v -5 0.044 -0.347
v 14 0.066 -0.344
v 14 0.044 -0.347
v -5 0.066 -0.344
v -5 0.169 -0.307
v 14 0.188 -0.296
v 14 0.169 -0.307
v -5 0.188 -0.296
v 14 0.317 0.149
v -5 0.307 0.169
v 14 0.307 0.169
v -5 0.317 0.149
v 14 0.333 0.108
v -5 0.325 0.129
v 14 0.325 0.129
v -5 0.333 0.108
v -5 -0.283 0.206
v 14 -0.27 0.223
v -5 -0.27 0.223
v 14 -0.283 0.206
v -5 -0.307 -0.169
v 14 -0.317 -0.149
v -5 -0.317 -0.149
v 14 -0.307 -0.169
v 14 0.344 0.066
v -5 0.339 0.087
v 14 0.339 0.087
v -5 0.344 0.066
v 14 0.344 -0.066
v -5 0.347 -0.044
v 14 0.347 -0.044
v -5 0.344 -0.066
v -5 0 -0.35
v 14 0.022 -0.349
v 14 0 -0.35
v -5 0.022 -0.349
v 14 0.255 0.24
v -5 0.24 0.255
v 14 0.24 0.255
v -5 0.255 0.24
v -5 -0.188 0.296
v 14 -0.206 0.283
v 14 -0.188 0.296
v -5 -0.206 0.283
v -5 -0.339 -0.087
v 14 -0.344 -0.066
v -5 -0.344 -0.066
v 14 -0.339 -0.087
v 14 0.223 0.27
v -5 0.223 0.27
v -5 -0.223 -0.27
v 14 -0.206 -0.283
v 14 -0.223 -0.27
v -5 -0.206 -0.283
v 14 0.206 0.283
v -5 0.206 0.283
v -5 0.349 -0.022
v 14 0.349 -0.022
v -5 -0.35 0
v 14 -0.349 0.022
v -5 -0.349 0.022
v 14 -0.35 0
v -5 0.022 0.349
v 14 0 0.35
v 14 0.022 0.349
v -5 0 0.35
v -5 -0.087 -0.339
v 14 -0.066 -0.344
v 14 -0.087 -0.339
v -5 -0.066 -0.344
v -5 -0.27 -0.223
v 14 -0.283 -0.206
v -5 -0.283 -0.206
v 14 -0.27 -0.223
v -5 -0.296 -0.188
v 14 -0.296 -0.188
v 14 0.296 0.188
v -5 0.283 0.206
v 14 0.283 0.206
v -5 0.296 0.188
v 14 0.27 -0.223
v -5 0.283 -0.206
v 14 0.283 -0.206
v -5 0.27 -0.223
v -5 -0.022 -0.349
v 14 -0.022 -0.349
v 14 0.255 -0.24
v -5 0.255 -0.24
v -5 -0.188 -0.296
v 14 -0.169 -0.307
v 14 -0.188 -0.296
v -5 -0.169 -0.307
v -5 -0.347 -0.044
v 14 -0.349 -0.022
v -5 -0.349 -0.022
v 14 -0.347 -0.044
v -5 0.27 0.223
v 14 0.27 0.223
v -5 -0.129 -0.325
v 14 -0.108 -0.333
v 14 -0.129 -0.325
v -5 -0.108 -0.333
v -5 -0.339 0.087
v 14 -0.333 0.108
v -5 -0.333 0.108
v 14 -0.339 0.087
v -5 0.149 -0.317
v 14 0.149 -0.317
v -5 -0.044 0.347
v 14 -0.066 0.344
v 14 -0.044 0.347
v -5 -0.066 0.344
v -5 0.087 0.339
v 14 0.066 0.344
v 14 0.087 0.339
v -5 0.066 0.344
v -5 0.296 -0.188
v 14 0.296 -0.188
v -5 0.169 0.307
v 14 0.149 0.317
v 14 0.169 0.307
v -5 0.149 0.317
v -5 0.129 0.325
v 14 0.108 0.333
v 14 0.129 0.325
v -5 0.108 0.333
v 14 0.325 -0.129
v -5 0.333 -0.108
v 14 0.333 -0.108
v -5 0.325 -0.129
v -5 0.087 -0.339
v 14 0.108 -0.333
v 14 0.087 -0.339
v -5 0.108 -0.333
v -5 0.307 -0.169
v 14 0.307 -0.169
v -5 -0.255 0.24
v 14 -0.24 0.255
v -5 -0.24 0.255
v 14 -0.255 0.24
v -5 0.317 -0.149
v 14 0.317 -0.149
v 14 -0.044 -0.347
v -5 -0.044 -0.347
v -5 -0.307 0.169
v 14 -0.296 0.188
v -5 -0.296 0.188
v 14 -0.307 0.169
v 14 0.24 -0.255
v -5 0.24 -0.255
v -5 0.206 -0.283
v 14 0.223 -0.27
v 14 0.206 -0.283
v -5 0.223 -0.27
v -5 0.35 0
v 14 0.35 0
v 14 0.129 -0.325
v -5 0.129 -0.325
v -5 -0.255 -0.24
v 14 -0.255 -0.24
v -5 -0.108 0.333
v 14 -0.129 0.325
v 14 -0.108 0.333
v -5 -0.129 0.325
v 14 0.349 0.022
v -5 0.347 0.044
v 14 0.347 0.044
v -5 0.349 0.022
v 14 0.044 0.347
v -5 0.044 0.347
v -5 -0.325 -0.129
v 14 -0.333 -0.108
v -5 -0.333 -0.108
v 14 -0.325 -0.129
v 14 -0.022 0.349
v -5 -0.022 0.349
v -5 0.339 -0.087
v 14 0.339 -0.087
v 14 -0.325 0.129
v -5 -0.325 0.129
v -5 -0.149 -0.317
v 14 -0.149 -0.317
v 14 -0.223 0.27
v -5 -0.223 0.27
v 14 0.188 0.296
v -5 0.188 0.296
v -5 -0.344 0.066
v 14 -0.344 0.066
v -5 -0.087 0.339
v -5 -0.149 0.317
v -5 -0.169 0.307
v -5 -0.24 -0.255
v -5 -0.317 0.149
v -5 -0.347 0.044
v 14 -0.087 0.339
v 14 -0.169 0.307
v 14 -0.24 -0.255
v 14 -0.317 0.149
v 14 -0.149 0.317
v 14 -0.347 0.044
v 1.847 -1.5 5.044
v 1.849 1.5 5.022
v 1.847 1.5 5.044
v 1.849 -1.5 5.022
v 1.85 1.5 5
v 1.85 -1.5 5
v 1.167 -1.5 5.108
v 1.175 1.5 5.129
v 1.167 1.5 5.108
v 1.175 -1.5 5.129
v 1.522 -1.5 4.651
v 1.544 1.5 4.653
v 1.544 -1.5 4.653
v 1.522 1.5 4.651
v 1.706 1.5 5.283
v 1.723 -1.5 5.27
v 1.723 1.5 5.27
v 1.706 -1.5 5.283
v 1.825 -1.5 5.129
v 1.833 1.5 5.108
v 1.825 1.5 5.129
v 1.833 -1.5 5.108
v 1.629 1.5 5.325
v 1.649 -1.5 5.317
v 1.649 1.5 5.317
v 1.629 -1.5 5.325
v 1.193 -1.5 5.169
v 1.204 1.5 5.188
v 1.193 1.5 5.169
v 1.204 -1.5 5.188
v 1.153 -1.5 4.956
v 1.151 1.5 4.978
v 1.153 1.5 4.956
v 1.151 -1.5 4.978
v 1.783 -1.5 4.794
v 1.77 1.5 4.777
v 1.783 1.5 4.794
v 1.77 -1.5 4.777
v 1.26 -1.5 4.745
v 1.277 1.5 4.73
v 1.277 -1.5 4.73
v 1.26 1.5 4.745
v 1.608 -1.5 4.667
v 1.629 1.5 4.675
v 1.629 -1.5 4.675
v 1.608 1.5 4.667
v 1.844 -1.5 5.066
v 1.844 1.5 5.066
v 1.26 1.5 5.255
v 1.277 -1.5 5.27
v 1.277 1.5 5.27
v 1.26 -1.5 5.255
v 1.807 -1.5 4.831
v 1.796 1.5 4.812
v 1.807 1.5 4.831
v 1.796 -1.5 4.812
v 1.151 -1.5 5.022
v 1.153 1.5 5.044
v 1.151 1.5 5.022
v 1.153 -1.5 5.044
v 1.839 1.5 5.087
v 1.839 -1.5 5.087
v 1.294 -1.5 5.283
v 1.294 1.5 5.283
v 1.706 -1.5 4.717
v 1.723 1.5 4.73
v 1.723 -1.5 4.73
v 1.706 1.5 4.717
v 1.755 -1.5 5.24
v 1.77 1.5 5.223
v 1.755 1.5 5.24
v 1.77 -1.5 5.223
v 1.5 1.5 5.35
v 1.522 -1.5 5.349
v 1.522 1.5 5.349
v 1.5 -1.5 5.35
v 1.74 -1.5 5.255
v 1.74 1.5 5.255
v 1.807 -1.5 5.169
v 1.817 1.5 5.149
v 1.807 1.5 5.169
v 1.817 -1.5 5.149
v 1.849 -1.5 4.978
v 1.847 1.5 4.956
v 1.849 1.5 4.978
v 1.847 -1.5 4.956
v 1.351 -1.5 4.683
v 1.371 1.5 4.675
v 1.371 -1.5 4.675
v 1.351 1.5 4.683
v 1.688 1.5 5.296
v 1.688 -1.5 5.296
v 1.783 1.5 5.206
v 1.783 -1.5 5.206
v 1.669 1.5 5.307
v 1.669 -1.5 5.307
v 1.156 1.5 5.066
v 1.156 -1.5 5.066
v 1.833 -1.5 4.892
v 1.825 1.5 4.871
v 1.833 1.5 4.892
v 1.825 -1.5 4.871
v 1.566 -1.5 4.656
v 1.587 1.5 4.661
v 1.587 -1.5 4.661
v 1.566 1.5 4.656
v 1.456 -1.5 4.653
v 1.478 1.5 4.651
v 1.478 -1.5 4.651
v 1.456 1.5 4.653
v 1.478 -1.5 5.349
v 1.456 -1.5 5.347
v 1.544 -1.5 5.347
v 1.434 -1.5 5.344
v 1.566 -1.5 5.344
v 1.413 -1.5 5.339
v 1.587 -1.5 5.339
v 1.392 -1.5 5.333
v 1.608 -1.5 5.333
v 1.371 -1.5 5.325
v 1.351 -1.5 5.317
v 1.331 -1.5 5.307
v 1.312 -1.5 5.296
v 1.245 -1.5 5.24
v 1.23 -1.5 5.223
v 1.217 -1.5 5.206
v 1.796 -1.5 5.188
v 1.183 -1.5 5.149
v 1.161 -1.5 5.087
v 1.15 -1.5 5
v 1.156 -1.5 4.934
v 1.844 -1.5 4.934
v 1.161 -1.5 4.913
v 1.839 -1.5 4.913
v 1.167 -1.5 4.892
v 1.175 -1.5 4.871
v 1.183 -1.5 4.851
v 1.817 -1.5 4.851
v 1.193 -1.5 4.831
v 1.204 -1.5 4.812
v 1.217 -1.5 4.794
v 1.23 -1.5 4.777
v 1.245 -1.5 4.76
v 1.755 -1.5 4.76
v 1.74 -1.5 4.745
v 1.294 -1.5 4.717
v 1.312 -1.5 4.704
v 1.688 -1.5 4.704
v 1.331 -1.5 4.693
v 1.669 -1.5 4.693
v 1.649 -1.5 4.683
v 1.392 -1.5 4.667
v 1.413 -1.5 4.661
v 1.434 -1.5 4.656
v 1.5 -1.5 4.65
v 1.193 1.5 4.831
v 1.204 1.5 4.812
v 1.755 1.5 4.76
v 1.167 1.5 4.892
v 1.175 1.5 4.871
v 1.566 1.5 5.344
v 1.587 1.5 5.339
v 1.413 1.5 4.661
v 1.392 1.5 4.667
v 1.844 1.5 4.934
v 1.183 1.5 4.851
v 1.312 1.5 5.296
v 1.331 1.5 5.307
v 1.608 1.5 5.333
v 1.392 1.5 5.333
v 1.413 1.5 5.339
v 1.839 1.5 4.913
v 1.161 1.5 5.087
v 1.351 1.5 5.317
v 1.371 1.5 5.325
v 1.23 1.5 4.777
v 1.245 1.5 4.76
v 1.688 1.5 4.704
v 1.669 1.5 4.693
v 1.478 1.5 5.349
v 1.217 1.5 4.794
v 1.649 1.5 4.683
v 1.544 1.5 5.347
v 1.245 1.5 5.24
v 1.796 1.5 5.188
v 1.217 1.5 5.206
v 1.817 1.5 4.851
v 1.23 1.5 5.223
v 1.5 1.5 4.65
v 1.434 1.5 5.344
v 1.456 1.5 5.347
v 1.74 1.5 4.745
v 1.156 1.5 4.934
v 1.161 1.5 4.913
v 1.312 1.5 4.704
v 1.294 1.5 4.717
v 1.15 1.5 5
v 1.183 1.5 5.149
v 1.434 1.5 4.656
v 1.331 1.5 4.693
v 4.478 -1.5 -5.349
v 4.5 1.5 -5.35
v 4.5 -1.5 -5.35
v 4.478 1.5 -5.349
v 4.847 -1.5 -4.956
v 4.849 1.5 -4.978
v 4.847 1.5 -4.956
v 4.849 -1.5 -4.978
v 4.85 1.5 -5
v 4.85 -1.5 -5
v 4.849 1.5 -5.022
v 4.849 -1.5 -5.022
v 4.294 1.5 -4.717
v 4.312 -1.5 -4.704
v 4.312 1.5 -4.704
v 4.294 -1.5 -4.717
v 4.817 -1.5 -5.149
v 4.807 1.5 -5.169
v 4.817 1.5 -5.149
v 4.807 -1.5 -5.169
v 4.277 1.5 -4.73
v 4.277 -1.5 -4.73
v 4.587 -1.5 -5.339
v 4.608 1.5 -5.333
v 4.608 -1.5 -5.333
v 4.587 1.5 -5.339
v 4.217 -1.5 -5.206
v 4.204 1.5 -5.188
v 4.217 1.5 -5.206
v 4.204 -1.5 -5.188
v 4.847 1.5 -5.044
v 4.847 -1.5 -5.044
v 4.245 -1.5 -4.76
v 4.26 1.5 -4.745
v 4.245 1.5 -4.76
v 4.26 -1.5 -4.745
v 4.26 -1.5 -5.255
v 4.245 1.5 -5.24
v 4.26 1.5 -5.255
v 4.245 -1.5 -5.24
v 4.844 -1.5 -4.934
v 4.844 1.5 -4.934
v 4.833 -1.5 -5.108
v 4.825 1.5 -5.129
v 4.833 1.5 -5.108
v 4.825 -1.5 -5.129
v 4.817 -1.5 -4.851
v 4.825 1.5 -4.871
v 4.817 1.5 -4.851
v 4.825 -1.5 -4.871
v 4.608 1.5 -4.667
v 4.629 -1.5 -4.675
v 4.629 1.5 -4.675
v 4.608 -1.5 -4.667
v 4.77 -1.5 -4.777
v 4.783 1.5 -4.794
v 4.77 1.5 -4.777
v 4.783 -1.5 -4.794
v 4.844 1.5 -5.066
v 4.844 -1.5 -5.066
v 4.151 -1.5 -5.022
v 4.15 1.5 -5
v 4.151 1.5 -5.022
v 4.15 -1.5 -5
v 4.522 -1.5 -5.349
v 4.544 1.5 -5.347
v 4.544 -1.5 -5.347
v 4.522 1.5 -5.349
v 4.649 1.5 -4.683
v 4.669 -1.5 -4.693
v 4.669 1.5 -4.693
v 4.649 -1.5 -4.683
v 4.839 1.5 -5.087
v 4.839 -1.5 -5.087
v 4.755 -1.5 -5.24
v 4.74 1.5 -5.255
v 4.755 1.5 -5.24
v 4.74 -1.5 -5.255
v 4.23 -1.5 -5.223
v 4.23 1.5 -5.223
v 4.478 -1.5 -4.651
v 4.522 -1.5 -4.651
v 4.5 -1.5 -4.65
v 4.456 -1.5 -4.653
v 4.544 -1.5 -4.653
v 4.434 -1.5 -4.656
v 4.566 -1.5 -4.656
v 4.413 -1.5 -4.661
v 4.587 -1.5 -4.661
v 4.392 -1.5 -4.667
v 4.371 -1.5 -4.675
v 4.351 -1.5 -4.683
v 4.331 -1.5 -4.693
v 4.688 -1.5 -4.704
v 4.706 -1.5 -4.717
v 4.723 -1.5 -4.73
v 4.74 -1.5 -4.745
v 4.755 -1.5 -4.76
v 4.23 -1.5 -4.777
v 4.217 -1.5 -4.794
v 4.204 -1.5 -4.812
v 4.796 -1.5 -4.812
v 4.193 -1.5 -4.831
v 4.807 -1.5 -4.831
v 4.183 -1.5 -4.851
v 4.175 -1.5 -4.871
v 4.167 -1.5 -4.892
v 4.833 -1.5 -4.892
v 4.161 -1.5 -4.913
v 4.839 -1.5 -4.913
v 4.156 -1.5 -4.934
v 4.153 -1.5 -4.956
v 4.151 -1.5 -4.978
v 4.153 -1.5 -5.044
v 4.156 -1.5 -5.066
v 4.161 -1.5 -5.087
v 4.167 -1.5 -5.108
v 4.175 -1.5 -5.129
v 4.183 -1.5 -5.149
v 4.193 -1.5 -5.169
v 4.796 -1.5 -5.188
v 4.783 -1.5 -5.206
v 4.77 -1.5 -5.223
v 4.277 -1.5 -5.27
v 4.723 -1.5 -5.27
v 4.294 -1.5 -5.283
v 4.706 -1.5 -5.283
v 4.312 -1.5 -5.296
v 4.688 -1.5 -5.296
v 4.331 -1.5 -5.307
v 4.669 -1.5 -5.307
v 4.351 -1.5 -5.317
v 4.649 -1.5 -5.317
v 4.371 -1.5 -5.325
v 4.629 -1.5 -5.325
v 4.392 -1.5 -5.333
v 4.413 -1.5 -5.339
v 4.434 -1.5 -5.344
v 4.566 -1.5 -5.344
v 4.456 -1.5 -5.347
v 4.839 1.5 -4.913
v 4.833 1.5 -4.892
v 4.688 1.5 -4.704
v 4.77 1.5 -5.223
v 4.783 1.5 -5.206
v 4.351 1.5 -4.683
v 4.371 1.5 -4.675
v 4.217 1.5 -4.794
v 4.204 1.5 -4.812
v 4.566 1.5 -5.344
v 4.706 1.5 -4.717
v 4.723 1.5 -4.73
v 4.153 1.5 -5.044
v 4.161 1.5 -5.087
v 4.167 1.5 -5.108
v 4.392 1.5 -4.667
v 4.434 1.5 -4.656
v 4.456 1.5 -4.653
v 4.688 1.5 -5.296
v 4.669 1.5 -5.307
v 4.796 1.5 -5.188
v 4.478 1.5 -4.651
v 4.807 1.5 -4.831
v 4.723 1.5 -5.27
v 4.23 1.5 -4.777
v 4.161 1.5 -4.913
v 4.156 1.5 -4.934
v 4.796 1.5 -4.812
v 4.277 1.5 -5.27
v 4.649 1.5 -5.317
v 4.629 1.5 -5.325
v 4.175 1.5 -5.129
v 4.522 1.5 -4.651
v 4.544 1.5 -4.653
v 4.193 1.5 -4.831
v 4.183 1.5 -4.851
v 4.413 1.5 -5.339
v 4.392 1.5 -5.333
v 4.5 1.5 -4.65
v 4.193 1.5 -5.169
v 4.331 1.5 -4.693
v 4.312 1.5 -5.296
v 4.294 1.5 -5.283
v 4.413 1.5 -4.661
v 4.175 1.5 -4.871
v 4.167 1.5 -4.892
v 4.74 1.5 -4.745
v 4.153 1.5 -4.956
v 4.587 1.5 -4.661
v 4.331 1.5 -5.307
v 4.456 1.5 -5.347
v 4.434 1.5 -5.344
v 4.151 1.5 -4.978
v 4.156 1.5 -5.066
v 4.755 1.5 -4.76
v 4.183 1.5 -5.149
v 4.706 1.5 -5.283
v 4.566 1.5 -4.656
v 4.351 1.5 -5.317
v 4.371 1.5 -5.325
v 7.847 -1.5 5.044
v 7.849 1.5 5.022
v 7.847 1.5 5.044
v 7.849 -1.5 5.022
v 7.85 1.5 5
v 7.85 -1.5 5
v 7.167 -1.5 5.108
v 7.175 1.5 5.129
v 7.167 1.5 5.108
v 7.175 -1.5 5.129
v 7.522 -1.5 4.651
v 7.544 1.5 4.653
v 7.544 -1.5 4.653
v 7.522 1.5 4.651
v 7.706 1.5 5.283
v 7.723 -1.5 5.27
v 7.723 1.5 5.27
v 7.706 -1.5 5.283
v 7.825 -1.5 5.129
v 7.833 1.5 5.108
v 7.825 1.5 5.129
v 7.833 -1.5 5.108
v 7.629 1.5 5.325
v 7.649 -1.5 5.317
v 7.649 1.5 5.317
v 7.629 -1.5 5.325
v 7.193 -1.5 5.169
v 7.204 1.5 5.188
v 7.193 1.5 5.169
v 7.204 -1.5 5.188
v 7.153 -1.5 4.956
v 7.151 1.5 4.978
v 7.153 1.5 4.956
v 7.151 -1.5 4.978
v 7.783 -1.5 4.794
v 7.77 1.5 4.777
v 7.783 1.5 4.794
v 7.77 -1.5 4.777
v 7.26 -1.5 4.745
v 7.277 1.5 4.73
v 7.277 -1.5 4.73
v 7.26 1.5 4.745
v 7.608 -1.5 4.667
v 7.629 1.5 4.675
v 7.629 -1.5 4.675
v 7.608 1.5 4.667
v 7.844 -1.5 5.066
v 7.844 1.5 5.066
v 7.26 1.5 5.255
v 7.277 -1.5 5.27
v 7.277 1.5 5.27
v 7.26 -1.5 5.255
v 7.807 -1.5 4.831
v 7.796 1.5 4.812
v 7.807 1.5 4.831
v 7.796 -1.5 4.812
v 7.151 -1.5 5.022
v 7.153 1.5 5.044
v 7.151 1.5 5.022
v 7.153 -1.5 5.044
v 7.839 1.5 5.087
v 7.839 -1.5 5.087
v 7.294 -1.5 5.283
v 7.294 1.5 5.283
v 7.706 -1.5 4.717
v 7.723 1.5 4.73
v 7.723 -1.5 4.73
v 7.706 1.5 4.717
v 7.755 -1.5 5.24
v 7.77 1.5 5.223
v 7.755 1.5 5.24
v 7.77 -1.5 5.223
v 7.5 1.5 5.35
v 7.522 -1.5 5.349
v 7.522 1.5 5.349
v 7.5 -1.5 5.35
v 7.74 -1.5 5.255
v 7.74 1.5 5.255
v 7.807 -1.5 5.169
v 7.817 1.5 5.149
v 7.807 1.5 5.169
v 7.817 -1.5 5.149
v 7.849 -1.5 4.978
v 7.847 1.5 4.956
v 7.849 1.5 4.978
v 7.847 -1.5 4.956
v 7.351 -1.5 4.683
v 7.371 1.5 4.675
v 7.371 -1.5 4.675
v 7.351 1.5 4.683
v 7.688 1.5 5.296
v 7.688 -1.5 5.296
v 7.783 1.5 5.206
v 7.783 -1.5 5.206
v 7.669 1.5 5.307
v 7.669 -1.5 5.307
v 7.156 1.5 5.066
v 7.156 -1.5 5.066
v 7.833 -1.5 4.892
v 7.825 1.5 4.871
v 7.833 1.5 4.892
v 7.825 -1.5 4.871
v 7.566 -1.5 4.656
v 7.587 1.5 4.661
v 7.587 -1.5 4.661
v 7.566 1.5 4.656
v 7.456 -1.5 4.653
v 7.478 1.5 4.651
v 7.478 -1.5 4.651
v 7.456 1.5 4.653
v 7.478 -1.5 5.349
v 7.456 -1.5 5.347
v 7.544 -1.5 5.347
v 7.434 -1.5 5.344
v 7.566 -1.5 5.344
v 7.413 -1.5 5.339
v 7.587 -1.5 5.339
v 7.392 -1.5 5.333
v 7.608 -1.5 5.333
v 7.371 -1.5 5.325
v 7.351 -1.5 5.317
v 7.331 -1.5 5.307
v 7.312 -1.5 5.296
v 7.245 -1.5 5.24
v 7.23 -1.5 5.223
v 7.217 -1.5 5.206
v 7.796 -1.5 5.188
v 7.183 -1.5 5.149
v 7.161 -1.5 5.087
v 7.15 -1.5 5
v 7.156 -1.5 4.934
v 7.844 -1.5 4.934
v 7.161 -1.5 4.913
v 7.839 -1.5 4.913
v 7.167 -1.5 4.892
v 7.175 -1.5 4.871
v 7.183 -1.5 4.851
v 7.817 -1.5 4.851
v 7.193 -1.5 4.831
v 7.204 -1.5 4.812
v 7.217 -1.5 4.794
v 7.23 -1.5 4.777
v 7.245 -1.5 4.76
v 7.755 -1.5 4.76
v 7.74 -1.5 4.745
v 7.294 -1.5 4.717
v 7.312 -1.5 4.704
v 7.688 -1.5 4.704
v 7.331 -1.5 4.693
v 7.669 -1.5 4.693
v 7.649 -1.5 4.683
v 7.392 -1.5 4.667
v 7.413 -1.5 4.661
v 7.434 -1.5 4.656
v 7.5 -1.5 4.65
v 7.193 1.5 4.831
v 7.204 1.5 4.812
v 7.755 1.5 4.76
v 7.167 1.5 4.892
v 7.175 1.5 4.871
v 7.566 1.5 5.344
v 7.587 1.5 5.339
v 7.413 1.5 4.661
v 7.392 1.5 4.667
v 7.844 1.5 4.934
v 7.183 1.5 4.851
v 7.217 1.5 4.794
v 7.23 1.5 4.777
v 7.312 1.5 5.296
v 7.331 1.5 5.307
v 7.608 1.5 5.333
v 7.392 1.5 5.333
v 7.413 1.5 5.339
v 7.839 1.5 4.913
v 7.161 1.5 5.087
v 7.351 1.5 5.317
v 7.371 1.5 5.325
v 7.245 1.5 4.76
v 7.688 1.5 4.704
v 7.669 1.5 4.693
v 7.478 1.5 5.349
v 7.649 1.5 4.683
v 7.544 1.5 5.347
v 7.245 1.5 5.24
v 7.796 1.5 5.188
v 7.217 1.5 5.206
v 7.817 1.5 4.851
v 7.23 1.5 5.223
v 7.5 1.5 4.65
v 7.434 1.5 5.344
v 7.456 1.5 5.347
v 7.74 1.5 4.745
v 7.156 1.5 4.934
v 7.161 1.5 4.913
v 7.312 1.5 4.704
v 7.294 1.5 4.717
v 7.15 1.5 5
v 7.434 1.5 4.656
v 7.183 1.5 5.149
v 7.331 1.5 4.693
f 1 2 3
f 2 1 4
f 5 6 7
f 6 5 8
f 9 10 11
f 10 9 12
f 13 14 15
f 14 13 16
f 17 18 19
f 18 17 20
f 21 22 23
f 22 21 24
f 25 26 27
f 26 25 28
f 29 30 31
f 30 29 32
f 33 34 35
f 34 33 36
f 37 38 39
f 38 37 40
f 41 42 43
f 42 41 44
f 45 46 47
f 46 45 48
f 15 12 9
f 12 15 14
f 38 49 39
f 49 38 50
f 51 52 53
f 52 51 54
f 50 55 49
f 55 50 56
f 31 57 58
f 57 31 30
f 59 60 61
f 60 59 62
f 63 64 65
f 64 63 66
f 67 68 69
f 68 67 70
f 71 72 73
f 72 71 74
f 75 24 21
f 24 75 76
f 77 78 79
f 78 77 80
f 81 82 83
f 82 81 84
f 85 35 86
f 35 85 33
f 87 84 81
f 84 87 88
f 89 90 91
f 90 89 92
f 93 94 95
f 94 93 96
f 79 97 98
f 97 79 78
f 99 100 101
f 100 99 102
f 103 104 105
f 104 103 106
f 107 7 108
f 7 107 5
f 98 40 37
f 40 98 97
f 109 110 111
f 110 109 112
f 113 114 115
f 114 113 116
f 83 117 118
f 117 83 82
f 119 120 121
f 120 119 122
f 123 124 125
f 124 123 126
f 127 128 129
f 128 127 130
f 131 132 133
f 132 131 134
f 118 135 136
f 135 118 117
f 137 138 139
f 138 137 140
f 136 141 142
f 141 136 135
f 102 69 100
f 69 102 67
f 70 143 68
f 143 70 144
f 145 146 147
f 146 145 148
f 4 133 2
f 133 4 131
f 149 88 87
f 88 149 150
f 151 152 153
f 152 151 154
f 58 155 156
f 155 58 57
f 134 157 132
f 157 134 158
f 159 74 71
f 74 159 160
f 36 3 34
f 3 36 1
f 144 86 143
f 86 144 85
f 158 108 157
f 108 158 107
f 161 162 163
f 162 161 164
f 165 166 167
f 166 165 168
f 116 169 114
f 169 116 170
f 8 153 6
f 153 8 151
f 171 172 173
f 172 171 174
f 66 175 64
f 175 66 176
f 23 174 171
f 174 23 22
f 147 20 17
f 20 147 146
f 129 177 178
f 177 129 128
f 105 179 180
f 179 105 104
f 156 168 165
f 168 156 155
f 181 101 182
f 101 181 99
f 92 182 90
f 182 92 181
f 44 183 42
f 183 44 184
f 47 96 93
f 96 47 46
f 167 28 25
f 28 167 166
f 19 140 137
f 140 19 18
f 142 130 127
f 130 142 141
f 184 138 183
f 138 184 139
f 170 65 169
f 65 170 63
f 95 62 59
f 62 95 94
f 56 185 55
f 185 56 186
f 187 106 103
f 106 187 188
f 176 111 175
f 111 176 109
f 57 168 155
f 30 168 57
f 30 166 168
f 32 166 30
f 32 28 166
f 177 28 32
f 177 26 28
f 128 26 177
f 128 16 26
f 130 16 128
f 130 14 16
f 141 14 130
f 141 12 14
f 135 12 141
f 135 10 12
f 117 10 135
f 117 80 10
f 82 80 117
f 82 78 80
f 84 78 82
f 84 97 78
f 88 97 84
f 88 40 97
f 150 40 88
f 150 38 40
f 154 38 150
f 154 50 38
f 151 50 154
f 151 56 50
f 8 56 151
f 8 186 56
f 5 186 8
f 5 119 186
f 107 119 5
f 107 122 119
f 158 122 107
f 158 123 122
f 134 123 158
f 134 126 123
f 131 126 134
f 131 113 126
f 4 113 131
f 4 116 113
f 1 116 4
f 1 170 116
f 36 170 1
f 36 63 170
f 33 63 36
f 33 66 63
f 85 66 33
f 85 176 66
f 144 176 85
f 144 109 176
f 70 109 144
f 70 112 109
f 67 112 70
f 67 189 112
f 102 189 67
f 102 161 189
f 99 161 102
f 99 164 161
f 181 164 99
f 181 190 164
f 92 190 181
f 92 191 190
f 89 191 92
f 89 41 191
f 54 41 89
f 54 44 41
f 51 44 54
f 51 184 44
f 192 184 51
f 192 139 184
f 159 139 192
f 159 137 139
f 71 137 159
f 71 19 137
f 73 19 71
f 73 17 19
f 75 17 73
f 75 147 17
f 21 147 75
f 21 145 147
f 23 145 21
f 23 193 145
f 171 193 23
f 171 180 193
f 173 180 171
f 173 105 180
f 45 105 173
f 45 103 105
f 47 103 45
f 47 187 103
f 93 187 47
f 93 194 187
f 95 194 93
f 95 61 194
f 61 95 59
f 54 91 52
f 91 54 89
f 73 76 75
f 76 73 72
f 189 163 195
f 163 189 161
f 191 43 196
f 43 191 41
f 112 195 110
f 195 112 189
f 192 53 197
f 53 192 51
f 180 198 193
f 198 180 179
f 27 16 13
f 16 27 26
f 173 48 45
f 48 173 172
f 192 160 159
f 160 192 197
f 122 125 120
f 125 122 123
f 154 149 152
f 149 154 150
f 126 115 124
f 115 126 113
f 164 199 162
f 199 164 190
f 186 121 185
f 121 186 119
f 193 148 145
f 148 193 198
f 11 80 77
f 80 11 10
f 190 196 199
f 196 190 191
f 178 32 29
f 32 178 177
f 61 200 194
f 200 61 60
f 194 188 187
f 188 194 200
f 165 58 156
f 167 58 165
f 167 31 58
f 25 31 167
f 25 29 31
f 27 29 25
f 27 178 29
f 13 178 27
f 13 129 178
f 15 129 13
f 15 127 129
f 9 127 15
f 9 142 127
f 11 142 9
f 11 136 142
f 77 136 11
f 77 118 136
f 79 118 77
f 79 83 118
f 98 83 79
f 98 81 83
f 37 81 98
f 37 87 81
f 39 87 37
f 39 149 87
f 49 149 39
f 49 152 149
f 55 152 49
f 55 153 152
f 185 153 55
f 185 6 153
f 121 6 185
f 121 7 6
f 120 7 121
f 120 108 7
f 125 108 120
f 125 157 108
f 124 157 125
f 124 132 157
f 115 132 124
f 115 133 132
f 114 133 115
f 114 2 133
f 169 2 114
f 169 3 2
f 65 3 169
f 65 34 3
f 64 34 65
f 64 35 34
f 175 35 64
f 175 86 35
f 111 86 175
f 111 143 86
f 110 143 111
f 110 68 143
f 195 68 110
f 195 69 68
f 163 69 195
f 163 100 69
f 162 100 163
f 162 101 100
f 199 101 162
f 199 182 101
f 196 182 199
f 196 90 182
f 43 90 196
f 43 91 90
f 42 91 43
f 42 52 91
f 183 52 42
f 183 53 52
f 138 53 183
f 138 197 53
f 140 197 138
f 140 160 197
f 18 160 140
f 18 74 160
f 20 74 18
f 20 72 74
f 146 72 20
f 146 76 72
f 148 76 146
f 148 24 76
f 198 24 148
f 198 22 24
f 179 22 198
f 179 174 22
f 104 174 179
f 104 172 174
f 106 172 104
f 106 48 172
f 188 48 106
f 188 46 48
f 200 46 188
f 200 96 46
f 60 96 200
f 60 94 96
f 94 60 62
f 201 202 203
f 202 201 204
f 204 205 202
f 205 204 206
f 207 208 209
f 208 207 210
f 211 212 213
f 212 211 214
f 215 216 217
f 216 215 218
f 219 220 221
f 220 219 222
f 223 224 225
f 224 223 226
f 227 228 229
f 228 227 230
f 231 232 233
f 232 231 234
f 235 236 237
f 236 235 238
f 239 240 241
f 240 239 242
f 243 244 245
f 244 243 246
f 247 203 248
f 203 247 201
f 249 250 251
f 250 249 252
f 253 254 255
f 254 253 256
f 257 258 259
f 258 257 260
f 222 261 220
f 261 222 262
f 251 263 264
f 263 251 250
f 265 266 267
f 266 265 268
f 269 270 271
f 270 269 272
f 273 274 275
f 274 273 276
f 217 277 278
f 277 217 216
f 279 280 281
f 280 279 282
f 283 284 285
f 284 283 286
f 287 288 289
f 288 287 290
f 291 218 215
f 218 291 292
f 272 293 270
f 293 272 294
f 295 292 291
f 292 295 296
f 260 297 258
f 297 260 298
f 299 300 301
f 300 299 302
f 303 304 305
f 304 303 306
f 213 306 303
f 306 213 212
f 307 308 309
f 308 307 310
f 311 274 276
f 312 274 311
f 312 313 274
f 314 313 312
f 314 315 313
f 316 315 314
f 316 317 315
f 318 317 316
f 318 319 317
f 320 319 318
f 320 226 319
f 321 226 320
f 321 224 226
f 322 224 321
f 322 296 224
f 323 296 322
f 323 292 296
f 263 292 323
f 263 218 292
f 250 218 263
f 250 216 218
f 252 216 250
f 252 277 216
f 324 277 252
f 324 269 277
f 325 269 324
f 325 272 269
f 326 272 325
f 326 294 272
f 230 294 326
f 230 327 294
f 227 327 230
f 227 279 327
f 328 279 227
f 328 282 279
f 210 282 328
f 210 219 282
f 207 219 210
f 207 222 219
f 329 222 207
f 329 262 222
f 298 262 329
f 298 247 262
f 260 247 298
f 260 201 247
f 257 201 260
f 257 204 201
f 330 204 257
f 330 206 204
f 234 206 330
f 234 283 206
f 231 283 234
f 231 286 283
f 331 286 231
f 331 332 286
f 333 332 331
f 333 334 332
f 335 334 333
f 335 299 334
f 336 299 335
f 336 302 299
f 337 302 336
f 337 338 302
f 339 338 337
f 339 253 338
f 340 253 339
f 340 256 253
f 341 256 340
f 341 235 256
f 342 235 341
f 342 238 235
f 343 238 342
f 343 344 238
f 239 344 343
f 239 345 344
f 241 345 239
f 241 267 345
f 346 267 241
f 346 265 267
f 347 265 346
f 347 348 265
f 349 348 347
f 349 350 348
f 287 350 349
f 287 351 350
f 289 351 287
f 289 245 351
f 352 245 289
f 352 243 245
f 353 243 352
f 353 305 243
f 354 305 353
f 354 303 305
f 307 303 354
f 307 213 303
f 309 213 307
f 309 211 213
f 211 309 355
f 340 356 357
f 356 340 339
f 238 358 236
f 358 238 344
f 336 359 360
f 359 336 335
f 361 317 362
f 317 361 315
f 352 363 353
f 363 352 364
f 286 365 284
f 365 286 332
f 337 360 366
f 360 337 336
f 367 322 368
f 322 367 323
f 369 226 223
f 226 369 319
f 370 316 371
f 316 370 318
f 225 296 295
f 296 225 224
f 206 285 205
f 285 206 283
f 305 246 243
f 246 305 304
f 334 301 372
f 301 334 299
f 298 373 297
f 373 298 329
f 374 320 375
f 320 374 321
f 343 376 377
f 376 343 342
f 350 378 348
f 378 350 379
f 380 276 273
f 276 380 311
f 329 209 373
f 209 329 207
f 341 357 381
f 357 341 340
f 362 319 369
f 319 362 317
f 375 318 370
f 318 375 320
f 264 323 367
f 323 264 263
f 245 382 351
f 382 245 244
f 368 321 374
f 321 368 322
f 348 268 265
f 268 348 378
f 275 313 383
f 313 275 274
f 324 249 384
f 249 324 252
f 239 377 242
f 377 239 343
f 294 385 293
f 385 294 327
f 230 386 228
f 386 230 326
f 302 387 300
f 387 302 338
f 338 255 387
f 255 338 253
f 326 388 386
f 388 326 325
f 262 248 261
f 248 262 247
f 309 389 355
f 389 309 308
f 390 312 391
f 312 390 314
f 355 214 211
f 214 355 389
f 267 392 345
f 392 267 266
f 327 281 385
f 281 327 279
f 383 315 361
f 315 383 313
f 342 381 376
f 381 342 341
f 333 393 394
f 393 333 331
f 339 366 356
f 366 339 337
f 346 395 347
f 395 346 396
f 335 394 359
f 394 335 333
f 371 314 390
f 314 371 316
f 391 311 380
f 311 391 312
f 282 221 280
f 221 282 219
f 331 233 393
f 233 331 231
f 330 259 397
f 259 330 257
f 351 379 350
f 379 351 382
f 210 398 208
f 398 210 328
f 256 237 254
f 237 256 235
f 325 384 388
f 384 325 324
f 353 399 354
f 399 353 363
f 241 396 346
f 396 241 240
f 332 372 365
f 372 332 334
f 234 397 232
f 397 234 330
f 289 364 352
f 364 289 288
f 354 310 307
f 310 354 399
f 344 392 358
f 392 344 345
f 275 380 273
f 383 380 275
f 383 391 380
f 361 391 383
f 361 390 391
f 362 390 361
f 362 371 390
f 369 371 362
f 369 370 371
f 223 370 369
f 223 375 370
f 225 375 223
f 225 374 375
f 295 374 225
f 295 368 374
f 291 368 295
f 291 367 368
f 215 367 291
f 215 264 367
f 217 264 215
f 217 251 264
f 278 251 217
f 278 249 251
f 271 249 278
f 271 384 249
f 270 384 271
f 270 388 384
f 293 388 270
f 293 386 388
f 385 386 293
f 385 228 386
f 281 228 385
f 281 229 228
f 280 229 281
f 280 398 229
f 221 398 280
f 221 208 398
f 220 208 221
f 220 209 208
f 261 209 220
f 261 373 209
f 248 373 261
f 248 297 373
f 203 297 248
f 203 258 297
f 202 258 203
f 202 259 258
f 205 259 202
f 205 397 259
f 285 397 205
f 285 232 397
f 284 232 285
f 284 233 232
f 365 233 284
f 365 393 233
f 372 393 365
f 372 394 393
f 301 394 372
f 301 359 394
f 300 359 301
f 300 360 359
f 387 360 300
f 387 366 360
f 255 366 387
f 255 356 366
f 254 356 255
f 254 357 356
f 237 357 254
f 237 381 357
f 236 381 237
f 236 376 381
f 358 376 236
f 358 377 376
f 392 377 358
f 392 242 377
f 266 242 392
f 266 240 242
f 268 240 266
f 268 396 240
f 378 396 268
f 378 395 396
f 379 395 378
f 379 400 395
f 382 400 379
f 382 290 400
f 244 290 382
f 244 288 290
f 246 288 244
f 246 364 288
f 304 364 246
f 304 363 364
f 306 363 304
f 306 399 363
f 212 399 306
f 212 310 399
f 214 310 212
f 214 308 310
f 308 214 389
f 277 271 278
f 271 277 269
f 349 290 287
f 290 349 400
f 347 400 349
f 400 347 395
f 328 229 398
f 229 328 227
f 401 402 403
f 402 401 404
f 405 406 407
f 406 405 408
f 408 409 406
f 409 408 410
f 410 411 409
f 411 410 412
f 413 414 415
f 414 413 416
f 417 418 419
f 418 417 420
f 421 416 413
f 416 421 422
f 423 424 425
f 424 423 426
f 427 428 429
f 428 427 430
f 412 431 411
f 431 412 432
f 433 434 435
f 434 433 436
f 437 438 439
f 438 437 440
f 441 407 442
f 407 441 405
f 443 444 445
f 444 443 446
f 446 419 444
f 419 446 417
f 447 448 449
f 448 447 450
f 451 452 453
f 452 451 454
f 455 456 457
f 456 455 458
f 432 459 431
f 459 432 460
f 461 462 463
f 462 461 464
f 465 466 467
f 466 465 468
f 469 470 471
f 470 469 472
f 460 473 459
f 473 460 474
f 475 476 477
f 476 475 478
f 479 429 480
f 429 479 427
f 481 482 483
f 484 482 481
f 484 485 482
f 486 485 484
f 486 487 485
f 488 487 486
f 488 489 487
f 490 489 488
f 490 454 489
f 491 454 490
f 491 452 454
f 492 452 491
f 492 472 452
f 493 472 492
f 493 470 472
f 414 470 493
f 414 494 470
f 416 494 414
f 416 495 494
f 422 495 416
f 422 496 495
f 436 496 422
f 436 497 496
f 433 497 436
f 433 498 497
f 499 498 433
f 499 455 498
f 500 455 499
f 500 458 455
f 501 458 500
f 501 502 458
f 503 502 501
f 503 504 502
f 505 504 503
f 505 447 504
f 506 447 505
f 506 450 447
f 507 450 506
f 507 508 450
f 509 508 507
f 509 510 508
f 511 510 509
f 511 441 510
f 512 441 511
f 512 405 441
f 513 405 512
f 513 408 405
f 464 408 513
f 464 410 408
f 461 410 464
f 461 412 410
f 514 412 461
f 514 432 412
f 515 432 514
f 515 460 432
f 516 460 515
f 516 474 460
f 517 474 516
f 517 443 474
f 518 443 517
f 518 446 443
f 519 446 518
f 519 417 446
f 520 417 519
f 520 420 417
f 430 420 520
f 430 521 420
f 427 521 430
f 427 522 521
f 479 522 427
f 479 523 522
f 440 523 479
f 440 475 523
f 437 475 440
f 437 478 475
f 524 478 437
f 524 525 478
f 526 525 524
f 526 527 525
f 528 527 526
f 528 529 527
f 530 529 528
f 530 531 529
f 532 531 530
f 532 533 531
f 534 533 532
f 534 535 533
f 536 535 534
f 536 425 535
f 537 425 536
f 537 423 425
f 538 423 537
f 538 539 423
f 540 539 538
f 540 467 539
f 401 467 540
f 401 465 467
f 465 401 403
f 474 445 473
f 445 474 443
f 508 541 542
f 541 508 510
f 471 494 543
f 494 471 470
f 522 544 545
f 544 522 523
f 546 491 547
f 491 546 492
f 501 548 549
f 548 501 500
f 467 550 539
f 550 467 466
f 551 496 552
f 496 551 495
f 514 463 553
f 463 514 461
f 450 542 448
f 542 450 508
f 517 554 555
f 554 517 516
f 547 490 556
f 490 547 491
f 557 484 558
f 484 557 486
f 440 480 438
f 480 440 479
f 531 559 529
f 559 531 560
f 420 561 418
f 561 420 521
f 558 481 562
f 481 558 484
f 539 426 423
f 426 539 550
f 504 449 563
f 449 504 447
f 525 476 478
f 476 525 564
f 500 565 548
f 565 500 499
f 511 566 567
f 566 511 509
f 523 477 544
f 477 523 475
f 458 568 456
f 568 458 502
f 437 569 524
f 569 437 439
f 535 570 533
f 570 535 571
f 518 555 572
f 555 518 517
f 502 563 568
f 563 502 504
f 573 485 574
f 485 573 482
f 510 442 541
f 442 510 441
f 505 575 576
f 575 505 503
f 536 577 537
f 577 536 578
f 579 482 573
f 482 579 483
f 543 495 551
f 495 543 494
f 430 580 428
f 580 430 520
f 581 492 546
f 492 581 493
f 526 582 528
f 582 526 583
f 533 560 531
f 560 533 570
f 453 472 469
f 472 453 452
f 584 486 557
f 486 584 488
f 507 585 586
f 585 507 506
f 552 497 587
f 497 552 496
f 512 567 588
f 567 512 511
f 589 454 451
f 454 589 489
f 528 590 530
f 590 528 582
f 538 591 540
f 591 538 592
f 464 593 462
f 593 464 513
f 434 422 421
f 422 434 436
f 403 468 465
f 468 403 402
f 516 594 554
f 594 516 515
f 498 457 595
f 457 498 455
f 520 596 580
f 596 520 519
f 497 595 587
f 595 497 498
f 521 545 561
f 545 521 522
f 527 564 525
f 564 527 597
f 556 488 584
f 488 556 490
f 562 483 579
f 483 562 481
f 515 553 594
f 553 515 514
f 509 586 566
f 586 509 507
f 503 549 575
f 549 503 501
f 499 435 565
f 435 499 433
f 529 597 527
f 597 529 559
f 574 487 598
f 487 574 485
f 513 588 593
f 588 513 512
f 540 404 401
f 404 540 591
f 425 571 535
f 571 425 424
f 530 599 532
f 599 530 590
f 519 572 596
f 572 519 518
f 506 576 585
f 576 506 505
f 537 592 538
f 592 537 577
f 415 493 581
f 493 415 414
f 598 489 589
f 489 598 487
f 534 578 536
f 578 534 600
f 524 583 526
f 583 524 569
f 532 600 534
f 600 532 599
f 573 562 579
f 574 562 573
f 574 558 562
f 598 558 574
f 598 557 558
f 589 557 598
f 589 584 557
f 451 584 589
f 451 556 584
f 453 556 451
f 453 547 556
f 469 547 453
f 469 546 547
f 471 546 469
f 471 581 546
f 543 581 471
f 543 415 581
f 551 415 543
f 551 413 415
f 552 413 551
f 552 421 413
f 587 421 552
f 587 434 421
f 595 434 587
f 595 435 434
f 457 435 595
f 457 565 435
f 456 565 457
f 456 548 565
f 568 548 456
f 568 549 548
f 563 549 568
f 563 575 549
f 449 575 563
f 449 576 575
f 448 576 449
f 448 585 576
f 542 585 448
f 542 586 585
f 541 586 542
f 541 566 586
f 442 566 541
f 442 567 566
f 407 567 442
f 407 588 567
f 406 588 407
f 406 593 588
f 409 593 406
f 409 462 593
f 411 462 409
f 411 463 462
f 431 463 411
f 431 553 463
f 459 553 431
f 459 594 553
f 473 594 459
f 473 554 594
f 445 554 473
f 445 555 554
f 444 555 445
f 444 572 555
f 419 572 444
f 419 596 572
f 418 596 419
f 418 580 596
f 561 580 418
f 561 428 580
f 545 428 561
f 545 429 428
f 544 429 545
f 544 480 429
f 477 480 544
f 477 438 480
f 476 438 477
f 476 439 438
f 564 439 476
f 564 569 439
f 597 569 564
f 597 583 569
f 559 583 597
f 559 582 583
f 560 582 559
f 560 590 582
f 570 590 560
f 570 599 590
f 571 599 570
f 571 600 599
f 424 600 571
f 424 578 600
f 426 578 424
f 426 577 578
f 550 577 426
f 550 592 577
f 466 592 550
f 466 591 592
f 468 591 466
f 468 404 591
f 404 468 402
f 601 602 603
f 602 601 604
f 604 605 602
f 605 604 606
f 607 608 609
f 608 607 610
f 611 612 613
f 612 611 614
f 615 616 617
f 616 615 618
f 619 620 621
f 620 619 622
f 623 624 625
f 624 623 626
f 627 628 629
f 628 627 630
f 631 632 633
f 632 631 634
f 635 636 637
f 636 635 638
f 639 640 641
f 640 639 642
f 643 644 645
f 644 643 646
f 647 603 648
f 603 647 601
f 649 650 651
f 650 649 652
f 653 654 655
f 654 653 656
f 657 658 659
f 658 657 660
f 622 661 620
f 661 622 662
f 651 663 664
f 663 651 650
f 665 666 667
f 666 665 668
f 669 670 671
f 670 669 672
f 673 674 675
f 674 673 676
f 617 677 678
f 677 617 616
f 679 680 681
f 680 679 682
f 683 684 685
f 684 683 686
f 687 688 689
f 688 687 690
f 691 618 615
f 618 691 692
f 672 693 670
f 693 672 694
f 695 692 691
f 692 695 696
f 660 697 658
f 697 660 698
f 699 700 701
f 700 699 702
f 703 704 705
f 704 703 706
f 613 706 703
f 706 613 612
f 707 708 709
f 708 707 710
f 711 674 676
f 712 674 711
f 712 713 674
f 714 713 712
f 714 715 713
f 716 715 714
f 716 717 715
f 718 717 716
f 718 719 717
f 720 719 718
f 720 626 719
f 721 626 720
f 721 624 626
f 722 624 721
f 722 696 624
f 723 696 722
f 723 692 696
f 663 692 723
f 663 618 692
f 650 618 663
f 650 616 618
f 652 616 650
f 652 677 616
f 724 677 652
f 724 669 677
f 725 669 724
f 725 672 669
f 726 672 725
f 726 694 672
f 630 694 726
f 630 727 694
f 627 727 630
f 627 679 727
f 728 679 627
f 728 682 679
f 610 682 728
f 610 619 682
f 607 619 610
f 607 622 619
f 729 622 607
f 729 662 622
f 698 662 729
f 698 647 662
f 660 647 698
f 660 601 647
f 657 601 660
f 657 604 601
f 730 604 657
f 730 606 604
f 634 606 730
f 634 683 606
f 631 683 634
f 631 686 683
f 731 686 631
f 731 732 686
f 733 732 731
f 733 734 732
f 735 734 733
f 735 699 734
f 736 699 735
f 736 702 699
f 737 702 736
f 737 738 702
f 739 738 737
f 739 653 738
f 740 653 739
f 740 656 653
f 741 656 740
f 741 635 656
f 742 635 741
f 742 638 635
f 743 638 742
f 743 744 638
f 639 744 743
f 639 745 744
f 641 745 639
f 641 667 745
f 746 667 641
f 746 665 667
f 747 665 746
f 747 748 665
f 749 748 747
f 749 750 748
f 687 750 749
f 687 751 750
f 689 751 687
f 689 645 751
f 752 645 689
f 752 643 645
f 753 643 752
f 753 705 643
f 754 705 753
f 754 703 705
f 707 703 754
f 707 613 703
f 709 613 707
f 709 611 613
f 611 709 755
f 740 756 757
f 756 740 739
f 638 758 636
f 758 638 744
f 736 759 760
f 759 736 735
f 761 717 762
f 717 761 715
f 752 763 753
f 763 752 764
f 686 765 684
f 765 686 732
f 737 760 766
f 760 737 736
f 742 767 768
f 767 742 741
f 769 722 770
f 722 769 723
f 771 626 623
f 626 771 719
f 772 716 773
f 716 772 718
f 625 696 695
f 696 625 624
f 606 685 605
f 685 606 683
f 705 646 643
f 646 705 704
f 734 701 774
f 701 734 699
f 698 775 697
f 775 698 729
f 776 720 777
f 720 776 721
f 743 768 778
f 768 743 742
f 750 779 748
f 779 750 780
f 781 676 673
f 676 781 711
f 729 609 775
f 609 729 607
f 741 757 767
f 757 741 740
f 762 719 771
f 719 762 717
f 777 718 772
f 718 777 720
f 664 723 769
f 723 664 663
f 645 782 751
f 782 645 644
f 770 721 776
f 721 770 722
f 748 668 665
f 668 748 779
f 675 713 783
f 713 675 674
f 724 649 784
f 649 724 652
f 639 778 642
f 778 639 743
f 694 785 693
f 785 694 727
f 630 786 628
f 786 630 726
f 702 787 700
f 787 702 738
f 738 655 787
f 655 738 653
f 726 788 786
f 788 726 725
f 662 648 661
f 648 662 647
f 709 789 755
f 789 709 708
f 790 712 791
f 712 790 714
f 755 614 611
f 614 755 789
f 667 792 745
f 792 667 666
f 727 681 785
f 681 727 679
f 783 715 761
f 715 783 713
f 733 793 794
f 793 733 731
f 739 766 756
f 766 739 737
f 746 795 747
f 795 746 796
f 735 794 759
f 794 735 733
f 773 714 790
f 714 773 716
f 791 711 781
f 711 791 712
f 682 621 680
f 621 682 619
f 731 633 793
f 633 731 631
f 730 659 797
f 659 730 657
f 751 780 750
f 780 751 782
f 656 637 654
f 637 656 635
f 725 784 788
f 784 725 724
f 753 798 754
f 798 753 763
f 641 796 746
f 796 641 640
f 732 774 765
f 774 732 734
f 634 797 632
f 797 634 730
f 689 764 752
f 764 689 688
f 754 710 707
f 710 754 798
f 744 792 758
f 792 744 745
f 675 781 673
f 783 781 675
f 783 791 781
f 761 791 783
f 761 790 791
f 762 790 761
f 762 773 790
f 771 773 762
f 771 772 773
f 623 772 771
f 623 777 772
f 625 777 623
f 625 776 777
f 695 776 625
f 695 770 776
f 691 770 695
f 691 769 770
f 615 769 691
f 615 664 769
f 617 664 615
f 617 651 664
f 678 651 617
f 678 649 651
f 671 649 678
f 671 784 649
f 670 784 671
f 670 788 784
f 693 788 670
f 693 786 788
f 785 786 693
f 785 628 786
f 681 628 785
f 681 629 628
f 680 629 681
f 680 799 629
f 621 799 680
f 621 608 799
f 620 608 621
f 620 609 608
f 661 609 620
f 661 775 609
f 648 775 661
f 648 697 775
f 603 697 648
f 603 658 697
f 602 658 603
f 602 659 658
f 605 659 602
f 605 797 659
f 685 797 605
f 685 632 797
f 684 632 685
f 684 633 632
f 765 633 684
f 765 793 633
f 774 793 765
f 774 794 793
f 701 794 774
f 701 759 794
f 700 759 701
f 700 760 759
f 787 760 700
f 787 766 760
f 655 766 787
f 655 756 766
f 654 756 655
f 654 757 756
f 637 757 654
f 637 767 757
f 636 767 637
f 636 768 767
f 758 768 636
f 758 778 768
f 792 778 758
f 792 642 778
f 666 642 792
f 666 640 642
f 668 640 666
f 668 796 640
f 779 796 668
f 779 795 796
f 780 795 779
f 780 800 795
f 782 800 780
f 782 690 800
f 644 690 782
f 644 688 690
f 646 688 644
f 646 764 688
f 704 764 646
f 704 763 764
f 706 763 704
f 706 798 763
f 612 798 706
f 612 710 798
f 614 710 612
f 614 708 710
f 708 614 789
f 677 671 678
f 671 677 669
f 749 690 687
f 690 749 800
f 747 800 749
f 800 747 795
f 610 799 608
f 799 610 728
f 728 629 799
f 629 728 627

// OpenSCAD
/* 
	Supplemental Serpentine 5

*/

$fn = 100; // increase the smoothness of the cylinders

// Define the dimensions
channel_diameter = 0.7; // Diameter of the channel
long_length = 10; // Length of the longer segment
short_length = 3; // Length of the shorter segment

// Long segments
translate([0, 0, 0])
    rotate([0, 90, 0])
    cylinder(h=long_length, d=channel_diameter, center=true);

translate([short_length, 0, 0])
    rotate([0, 90, 0])
    cylinder(h=long_length, d=channel_diameter, center=true);

translate([2*short_length, 0, 0])
    rotate([0, 90, 0])
    cylinder(h=long_length, d=channel_diameter, center=true);

translate([3*short_length, 0, 0])
    rotate([0, 90, 0])
    cylinder(h=long_length, d=channel_diameter, center=true);

// Short segments
translate([short_length/2, 0, long_length/2])
    rotate([90, 0, 0])
    cylinder(h=short_length, d=channel_diameter, center=true);

translate([3*short_length/2, 0, -long_length/2])
    rotate([90, 0, 0])
    cylinder(h=short_length, d=channel_diameter, center=true);

translate([5*short_length/2, 0, long_length/2])
    rotate([90, 0, 0])
    cylinder(h=short_length, d=channel_diameter, center=true);
